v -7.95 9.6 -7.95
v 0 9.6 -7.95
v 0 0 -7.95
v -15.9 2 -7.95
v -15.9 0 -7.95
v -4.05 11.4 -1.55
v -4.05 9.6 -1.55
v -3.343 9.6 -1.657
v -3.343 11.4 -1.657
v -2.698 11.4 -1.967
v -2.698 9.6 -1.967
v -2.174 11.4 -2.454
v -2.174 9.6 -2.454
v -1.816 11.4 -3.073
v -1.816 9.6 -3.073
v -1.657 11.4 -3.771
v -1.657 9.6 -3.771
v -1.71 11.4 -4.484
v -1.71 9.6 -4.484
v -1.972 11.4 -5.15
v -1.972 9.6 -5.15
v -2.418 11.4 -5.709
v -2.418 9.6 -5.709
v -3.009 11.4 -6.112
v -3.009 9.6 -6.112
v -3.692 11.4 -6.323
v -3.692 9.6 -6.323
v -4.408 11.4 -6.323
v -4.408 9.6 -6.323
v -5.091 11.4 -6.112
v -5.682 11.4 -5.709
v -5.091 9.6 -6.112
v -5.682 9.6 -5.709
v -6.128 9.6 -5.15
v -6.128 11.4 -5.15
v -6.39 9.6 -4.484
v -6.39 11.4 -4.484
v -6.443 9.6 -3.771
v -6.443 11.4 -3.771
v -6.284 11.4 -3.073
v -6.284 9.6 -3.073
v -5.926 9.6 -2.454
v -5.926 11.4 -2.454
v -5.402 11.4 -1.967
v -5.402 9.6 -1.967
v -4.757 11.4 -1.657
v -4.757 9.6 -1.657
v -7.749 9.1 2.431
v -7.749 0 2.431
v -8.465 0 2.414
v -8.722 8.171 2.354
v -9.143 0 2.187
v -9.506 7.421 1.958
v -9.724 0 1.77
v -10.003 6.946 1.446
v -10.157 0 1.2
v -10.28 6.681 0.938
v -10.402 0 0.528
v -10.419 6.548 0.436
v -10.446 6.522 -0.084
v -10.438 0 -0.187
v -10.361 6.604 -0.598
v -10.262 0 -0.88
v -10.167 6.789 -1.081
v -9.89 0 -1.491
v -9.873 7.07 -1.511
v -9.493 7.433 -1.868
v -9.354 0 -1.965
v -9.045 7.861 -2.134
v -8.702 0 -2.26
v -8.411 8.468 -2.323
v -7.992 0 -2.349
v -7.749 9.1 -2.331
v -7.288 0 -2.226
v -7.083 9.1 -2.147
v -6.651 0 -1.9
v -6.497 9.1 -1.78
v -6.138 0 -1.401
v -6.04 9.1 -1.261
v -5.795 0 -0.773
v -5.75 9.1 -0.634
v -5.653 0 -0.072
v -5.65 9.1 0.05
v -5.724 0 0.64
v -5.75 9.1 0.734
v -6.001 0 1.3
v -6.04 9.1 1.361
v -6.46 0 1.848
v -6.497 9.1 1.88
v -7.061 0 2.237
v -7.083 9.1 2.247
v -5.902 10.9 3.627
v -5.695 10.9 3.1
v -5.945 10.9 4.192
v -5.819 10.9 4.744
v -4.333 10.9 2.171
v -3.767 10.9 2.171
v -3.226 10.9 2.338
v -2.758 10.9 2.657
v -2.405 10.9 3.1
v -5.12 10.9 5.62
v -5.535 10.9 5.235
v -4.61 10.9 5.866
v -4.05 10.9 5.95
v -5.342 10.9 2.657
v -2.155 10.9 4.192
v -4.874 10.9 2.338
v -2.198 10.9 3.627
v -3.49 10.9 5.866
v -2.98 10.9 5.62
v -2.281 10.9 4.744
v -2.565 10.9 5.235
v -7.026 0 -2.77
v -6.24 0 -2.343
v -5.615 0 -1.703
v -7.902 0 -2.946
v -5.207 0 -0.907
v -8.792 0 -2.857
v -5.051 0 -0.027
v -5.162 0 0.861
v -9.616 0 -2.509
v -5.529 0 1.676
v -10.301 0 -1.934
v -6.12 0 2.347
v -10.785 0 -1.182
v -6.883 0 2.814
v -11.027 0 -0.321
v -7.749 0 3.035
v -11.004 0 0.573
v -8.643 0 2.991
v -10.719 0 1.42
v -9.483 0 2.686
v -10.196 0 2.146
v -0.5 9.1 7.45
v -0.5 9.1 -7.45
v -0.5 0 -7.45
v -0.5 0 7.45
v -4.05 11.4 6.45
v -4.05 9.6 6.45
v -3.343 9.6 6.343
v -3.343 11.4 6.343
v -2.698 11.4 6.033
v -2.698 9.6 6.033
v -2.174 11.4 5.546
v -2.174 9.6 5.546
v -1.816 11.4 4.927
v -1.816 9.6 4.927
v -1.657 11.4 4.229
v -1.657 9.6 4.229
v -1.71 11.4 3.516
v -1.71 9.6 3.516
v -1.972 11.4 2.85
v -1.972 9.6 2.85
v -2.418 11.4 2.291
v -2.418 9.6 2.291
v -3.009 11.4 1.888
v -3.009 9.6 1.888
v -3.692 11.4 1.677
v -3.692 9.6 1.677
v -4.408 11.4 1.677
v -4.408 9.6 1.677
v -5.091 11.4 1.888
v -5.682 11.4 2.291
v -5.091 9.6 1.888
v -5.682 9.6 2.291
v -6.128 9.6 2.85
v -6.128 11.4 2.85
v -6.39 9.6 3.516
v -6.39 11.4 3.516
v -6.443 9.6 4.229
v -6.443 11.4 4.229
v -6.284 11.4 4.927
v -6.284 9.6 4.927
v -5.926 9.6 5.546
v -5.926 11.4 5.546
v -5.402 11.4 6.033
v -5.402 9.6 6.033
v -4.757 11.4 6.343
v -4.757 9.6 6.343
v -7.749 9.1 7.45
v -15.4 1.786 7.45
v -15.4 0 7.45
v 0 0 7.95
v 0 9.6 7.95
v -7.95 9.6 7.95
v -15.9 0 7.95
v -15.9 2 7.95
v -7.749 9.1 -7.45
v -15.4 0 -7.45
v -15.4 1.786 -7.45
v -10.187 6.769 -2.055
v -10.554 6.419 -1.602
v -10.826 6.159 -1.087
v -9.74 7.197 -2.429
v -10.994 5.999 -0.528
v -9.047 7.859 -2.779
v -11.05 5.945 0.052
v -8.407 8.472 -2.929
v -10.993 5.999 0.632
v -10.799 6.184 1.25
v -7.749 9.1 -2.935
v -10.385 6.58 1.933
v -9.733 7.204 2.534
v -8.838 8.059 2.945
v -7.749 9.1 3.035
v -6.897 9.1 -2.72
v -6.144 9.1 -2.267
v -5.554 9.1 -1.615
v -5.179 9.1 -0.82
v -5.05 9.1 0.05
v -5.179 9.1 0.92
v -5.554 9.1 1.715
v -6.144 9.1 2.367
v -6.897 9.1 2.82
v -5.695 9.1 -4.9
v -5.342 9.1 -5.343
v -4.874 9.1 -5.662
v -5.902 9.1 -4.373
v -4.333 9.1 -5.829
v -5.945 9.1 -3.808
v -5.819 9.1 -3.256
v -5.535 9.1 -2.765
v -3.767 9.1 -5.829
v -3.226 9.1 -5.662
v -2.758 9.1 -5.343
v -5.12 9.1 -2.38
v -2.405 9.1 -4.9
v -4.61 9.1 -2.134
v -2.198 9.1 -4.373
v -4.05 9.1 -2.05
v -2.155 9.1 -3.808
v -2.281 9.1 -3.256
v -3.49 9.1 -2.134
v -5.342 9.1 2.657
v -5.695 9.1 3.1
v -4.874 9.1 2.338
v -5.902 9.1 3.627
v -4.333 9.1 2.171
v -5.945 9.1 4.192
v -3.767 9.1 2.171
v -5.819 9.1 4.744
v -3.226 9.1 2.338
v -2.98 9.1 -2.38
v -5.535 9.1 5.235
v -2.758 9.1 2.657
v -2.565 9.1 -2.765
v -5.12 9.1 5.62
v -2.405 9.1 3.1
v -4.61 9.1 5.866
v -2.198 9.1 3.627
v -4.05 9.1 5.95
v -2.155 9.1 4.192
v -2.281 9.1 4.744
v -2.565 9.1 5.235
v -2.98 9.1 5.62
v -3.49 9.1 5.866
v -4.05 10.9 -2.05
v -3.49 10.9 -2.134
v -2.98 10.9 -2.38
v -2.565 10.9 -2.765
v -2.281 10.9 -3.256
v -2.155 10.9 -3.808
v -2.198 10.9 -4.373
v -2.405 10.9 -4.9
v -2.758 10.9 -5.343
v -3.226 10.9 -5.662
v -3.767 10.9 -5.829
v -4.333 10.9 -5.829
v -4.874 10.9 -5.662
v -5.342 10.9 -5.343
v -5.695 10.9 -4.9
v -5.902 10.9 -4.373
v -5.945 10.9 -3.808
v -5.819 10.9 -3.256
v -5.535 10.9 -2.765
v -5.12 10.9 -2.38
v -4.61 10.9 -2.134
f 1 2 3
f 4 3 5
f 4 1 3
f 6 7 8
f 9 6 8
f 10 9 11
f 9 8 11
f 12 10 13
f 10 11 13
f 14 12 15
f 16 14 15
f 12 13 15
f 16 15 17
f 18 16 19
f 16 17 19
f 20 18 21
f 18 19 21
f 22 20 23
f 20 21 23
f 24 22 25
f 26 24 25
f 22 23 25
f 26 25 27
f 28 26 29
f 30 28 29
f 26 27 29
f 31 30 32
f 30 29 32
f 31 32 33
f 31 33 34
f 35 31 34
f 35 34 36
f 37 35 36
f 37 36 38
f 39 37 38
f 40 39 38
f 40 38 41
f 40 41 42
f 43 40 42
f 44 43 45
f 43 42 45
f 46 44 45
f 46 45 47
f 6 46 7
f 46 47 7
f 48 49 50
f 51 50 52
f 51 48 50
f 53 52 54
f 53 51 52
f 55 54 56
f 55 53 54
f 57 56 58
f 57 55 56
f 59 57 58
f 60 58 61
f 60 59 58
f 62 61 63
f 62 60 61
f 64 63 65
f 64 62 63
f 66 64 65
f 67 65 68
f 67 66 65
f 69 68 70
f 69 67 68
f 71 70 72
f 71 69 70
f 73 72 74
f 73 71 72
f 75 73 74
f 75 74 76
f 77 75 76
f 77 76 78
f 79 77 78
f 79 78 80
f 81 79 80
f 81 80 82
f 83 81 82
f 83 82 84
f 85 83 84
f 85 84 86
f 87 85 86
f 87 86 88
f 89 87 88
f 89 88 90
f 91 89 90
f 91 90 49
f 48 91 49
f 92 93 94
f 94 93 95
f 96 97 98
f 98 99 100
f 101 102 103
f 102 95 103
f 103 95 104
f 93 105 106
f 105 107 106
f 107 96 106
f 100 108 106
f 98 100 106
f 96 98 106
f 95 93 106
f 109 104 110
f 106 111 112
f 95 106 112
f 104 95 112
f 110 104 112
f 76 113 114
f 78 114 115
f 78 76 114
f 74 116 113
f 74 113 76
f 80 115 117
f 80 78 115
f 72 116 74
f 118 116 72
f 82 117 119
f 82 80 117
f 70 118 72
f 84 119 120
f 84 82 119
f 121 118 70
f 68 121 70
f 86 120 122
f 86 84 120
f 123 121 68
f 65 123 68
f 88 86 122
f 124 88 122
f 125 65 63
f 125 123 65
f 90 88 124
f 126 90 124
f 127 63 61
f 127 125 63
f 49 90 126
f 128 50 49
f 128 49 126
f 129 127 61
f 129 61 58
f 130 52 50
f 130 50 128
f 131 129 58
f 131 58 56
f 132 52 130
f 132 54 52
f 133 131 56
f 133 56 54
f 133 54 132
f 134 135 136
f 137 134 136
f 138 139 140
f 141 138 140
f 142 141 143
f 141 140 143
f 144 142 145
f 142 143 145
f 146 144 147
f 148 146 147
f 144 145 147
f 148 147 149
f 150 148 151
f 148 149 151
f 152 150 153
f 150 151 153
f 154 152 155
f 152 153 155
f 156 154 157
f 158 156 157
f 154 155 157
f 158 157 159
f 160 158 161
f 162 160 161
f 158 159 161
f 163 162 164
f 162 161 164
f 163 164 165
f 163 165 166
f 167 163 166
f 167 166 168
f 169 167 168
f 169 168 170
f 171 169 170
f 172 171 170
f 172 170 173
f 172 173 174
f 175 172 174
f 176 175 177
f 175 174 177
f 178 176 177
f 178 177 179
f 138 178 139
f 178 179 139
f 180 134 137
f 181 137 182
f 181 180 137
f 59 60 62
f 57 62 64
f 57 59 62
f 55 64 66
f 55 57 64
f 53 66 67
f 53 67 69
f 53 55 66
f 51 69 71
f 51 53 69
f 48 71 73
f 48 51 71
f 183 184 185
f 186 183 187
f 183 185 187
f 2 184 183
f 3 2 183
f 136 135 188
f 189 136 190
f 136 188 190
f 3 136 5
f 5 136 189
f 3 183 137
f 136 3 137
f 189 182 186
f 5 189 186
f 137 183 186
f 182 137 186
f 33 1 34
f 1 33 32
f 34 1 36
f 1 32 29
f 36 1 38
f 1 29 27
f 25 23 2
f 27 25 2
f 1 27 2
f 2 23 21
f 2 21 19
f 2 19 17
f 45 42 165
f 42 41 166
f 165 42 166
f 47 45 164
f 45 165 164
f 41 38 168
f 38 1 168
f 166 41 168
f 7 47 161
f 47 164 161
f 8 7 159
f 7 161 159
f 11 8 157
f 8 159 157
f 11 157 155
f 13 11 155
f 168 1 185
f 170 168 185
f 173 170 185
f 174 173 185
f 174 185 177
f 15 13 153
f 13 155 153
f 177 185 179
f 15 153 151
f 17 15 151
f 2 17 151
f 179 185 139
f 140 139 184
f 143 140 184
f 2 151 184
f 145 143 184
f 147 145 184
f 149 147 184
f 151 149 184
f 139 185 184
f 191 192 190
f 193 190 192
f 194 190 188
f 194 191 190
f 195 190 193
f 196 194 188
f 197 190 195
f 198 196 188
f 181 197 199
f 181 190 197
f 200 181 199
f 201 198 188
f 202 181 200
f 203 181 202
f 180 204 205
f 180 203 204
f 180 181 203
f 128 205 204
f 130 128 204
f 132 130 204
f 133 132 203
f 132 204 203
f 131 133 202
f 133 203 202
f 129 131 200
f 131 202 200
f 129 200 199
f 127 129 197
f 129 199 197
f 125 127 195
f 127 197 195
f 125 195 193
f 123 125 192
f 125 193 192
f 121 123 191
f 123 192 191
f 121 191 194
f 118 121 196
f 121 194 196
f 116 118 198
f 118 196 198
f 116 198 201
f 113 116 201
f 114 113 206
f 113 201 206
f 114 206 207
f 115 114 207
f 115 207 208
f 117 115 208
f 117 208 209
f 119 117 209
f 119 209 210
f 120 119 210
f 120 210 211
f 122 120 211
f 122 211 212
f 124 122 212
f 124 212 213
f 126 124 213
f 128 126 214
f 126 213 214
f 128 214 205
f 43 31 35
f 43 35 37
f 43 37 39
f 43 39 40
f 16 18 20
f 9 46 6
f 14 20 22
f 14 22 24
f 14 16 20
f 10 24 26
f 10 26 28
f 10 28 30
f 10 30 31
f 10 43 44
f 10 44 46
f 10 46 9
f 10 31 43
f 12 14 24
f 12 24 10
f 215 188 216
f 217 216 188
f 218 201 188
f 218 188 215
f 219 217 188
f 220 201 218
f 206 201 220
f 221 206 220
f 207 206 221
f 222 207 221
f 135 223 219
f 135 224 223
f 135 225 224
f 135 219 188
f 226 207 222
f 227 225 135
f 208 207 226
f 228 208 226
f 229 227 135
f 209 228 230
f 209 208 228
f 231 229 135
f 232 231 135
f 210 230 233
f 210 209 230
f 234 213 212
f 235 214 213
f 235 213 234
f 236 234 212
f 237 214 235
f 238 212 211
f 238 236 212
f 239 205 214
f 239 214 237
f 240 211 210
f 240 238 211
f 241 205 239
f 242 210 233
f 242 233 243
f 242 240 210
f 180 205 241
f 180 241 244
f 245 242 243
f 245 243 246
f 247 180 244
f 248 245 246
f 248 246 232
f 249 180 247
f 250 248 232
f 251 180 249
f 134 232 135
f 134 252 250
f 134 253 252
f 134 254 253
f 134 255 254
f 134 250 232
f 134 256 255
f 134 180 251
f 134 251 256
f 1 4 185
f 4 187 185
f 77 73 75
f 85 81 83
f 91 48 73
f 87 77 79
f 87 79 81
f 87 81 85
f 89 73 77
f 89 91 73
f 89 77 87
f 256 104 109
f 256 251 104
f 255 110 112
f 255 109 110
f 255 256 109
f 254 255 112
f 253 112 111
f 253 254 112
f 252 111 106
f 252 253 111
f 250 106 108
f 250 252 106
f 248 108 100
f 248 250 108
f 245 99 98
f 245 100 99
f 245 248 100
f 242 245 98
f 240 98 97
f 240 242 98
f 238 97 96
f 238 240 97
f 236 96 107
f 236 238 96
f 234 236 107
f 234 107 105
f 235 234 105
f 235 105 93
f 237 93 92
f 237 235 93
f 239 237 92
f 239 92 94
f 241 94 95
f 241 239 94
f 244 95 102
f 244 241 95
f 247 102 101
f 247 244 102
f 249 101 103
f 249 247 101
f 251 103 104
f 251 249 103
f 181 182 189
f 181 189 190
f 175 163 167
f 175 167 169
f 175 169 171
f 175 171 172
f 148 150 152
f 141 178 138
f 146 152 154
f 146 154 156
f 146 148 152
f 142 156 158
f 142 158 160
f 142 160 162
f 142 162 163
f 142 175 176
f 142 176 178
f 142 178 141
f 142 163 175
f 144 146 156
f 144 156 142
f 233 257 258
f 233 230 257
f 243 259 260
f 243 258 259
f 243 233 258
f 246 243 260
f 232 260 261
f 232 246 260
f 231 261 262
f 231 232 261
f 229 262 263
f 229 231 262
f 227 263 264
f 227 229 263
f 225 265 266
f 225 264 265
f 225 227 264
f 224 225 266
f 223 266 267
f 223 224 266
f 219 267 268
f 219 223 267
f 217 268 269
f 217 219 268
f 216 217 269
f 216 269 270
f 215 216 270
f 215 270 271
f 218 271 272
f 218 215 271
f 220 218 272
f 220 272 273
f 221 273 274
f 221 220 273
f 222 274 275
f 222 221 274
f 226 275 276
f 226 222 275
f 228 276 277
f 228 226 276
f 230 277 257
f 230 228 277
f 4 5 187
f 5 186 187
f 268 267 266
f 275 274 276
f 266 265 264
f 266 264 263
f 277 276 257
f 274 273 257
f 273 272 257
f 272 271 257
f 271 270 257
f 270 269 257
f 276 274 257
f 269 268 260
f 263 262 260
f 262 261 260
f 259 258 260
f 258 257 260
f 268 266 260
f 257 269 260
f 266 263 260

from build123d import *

# Parameters (mm, degrees)
BOSS_EXTRUDE1_DEPTH = 7.95
SKETCH2_R           = 2.4
BOSS_EXTRUDE2_DEPTH = 1.8
LPATTERN1_COUNT     = 2
LPATTERN1_PITCH     = 8
SHELL1_T            = -0.5
SKETCH3_R           = 3
SKETCH3_R_2         = 2.4
BOSS_EXTRUDE3_DEPTH = 9.1
SKETCH4_W           = 10.998295323
SKETCH4_H           = 15.9
CUT_EXTRUDE1_DEPTH  = 15.757300106


with BuildPart() as part:
    # Sketch1 → Boss-Extrude1 (new, symmetric)
    with BuildSketch(Plane.XY):
        Polygon((0, 0), (-15.9, 0), (-15.9, 2), (-7.95, 9.6), (0, 9.6), align=None)
    extrude(amount=BOSS_EXTRUDE1_DEPTH, both=True)

    # Sketch2 → Boss-Extrude2 (add)
    with BuildSketch(Plane(origin=(0, 9.6, 0), x_dir=(1, 0, 0), z_dir=(0, 1, 0))):
        with Locations(Location((-4.05, -4.05, 0), (0, 0, 270))):
            Circle(SKETCH2_R)
    boss_extrude2 = extrude(amount=BOSS_EXTRUDE2_DEPTH)

    # LPattern1: Boss-Extrude2 ×2
    with Locations(*[(0, 0, -i * LPATTERN1_PITCH) for i in range(1, LPATTERN1_COUNT)]):
        add(boss_extrude2)

    # Shell1
    shell1_openings = [part.faces().sort_by_distance(p)[0] for p in [
        (-7.95, 0, 0),
    ]]
    offset(amount=SHELL1_T, openings=shell1_openings, kind=Kind.INTERSECTION)

    # Sketch3 → Boss-Extrude3 (add)
    with BuildSketch(Plane.XZ.offset(-9.1)):
        with Locations(Location((-8.05, 0.05, 0), (0, 0, 84.250353958))):
            Circle(SKETCH3_R)
        with Locations(Location((-8.05, 0.05, 0), (0, 0, 82.806112334))):
            Circle(SKETCH3_R_2, mode=Mode.SUBTRACT)
    extrude(amount=BOSS_EXTRUDE3_DEPTH)

    # Sketch4 → Cut-Extrude1 (cut, through all)
    with BuildSketch(Plane(origin=(-8.591290689, 8.986942234, 0), x_dir=(0.7228392916279055, 0.6910161781600108, 0), z_dir=(-0.6910161781600108, 0.7228392916279055, 0))):
        with Locations((-4.611964719, 0)):
            Rectangle(SKETCH4_W, SKETCH4_H)
    extrude(amount=CUT_EXTRUDE1_DEPTH, mode=Mode.SUBTRACT)


solid = part.part
